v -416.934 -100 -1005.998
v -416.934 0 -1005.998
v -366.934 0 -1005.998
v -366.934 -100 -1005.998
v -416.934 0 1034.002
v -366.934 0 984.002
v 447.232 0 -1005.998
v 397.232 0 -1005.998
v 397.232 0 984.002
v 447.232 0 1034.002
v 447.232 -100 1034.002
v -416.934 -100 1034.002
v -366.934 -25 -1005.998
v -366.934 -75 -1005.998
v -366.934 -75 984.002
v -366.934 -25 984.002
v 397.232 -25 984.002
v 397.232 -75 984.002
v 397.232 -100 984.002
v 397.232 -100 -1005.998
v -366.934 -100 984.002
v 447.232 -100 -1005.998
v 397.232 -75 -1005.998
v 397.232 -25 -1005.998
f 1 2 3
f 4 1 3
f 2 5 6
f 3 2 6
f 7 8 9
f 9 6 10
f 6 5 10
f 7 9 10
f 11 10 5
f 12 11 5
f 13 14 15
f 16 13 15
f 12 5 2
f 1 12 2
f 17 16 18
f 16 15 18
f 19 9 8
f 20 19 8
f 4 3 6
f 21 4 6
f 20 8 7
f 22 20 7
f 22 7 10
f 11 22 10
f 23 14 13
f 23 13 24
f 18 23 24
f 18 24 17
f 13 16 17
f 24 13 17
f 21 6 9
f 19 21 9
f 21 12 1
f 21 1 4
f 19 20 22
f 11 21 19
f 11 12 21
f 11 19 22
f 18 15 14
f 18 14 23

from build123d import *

# Parameters (mm, degrees)
F1_DEPTH      = 100
F3_W          = 764.166667
F3_H          = 1990
F4_DEPTH      = 25
F4_DEPTH_BACK = 25


with BuildPart() as f1:
    # F0 (on Front) → F1 (new body)
    with BuildSketch(Plane.XZ):
        Polygon((447.2323801669, 1034.0023847809), (-416.9342868331, 1034.0023847809), (-416.9342868331, -1005.9976152191), (-366.9342868331, -1005.9976152191), (-366.9342868331, 984.0023847809), (397.2323801669, 984.0023847809), (397.2323801669, -1005.9976152191), (447.2323801669, -1005.9976152191), align=None)
    extrude(amount=F1_DEPTH)


with BuildPart() as f4:
    # F3 (on mid) → F4 (new body, two sides)
    with BuildSketch(Plane.XZ.offset(50)) as f4_sk:
        with Locations((15.1490466669, -10.9976152191)):
            Rectangle(F3_W, F3_H)
    extrude(amount=F4_DEPTH)
    extrude(f4_sk.sketch, amount=-F4_DEPTH_BACK)


solid = Compound([f1.part, f4.part])
